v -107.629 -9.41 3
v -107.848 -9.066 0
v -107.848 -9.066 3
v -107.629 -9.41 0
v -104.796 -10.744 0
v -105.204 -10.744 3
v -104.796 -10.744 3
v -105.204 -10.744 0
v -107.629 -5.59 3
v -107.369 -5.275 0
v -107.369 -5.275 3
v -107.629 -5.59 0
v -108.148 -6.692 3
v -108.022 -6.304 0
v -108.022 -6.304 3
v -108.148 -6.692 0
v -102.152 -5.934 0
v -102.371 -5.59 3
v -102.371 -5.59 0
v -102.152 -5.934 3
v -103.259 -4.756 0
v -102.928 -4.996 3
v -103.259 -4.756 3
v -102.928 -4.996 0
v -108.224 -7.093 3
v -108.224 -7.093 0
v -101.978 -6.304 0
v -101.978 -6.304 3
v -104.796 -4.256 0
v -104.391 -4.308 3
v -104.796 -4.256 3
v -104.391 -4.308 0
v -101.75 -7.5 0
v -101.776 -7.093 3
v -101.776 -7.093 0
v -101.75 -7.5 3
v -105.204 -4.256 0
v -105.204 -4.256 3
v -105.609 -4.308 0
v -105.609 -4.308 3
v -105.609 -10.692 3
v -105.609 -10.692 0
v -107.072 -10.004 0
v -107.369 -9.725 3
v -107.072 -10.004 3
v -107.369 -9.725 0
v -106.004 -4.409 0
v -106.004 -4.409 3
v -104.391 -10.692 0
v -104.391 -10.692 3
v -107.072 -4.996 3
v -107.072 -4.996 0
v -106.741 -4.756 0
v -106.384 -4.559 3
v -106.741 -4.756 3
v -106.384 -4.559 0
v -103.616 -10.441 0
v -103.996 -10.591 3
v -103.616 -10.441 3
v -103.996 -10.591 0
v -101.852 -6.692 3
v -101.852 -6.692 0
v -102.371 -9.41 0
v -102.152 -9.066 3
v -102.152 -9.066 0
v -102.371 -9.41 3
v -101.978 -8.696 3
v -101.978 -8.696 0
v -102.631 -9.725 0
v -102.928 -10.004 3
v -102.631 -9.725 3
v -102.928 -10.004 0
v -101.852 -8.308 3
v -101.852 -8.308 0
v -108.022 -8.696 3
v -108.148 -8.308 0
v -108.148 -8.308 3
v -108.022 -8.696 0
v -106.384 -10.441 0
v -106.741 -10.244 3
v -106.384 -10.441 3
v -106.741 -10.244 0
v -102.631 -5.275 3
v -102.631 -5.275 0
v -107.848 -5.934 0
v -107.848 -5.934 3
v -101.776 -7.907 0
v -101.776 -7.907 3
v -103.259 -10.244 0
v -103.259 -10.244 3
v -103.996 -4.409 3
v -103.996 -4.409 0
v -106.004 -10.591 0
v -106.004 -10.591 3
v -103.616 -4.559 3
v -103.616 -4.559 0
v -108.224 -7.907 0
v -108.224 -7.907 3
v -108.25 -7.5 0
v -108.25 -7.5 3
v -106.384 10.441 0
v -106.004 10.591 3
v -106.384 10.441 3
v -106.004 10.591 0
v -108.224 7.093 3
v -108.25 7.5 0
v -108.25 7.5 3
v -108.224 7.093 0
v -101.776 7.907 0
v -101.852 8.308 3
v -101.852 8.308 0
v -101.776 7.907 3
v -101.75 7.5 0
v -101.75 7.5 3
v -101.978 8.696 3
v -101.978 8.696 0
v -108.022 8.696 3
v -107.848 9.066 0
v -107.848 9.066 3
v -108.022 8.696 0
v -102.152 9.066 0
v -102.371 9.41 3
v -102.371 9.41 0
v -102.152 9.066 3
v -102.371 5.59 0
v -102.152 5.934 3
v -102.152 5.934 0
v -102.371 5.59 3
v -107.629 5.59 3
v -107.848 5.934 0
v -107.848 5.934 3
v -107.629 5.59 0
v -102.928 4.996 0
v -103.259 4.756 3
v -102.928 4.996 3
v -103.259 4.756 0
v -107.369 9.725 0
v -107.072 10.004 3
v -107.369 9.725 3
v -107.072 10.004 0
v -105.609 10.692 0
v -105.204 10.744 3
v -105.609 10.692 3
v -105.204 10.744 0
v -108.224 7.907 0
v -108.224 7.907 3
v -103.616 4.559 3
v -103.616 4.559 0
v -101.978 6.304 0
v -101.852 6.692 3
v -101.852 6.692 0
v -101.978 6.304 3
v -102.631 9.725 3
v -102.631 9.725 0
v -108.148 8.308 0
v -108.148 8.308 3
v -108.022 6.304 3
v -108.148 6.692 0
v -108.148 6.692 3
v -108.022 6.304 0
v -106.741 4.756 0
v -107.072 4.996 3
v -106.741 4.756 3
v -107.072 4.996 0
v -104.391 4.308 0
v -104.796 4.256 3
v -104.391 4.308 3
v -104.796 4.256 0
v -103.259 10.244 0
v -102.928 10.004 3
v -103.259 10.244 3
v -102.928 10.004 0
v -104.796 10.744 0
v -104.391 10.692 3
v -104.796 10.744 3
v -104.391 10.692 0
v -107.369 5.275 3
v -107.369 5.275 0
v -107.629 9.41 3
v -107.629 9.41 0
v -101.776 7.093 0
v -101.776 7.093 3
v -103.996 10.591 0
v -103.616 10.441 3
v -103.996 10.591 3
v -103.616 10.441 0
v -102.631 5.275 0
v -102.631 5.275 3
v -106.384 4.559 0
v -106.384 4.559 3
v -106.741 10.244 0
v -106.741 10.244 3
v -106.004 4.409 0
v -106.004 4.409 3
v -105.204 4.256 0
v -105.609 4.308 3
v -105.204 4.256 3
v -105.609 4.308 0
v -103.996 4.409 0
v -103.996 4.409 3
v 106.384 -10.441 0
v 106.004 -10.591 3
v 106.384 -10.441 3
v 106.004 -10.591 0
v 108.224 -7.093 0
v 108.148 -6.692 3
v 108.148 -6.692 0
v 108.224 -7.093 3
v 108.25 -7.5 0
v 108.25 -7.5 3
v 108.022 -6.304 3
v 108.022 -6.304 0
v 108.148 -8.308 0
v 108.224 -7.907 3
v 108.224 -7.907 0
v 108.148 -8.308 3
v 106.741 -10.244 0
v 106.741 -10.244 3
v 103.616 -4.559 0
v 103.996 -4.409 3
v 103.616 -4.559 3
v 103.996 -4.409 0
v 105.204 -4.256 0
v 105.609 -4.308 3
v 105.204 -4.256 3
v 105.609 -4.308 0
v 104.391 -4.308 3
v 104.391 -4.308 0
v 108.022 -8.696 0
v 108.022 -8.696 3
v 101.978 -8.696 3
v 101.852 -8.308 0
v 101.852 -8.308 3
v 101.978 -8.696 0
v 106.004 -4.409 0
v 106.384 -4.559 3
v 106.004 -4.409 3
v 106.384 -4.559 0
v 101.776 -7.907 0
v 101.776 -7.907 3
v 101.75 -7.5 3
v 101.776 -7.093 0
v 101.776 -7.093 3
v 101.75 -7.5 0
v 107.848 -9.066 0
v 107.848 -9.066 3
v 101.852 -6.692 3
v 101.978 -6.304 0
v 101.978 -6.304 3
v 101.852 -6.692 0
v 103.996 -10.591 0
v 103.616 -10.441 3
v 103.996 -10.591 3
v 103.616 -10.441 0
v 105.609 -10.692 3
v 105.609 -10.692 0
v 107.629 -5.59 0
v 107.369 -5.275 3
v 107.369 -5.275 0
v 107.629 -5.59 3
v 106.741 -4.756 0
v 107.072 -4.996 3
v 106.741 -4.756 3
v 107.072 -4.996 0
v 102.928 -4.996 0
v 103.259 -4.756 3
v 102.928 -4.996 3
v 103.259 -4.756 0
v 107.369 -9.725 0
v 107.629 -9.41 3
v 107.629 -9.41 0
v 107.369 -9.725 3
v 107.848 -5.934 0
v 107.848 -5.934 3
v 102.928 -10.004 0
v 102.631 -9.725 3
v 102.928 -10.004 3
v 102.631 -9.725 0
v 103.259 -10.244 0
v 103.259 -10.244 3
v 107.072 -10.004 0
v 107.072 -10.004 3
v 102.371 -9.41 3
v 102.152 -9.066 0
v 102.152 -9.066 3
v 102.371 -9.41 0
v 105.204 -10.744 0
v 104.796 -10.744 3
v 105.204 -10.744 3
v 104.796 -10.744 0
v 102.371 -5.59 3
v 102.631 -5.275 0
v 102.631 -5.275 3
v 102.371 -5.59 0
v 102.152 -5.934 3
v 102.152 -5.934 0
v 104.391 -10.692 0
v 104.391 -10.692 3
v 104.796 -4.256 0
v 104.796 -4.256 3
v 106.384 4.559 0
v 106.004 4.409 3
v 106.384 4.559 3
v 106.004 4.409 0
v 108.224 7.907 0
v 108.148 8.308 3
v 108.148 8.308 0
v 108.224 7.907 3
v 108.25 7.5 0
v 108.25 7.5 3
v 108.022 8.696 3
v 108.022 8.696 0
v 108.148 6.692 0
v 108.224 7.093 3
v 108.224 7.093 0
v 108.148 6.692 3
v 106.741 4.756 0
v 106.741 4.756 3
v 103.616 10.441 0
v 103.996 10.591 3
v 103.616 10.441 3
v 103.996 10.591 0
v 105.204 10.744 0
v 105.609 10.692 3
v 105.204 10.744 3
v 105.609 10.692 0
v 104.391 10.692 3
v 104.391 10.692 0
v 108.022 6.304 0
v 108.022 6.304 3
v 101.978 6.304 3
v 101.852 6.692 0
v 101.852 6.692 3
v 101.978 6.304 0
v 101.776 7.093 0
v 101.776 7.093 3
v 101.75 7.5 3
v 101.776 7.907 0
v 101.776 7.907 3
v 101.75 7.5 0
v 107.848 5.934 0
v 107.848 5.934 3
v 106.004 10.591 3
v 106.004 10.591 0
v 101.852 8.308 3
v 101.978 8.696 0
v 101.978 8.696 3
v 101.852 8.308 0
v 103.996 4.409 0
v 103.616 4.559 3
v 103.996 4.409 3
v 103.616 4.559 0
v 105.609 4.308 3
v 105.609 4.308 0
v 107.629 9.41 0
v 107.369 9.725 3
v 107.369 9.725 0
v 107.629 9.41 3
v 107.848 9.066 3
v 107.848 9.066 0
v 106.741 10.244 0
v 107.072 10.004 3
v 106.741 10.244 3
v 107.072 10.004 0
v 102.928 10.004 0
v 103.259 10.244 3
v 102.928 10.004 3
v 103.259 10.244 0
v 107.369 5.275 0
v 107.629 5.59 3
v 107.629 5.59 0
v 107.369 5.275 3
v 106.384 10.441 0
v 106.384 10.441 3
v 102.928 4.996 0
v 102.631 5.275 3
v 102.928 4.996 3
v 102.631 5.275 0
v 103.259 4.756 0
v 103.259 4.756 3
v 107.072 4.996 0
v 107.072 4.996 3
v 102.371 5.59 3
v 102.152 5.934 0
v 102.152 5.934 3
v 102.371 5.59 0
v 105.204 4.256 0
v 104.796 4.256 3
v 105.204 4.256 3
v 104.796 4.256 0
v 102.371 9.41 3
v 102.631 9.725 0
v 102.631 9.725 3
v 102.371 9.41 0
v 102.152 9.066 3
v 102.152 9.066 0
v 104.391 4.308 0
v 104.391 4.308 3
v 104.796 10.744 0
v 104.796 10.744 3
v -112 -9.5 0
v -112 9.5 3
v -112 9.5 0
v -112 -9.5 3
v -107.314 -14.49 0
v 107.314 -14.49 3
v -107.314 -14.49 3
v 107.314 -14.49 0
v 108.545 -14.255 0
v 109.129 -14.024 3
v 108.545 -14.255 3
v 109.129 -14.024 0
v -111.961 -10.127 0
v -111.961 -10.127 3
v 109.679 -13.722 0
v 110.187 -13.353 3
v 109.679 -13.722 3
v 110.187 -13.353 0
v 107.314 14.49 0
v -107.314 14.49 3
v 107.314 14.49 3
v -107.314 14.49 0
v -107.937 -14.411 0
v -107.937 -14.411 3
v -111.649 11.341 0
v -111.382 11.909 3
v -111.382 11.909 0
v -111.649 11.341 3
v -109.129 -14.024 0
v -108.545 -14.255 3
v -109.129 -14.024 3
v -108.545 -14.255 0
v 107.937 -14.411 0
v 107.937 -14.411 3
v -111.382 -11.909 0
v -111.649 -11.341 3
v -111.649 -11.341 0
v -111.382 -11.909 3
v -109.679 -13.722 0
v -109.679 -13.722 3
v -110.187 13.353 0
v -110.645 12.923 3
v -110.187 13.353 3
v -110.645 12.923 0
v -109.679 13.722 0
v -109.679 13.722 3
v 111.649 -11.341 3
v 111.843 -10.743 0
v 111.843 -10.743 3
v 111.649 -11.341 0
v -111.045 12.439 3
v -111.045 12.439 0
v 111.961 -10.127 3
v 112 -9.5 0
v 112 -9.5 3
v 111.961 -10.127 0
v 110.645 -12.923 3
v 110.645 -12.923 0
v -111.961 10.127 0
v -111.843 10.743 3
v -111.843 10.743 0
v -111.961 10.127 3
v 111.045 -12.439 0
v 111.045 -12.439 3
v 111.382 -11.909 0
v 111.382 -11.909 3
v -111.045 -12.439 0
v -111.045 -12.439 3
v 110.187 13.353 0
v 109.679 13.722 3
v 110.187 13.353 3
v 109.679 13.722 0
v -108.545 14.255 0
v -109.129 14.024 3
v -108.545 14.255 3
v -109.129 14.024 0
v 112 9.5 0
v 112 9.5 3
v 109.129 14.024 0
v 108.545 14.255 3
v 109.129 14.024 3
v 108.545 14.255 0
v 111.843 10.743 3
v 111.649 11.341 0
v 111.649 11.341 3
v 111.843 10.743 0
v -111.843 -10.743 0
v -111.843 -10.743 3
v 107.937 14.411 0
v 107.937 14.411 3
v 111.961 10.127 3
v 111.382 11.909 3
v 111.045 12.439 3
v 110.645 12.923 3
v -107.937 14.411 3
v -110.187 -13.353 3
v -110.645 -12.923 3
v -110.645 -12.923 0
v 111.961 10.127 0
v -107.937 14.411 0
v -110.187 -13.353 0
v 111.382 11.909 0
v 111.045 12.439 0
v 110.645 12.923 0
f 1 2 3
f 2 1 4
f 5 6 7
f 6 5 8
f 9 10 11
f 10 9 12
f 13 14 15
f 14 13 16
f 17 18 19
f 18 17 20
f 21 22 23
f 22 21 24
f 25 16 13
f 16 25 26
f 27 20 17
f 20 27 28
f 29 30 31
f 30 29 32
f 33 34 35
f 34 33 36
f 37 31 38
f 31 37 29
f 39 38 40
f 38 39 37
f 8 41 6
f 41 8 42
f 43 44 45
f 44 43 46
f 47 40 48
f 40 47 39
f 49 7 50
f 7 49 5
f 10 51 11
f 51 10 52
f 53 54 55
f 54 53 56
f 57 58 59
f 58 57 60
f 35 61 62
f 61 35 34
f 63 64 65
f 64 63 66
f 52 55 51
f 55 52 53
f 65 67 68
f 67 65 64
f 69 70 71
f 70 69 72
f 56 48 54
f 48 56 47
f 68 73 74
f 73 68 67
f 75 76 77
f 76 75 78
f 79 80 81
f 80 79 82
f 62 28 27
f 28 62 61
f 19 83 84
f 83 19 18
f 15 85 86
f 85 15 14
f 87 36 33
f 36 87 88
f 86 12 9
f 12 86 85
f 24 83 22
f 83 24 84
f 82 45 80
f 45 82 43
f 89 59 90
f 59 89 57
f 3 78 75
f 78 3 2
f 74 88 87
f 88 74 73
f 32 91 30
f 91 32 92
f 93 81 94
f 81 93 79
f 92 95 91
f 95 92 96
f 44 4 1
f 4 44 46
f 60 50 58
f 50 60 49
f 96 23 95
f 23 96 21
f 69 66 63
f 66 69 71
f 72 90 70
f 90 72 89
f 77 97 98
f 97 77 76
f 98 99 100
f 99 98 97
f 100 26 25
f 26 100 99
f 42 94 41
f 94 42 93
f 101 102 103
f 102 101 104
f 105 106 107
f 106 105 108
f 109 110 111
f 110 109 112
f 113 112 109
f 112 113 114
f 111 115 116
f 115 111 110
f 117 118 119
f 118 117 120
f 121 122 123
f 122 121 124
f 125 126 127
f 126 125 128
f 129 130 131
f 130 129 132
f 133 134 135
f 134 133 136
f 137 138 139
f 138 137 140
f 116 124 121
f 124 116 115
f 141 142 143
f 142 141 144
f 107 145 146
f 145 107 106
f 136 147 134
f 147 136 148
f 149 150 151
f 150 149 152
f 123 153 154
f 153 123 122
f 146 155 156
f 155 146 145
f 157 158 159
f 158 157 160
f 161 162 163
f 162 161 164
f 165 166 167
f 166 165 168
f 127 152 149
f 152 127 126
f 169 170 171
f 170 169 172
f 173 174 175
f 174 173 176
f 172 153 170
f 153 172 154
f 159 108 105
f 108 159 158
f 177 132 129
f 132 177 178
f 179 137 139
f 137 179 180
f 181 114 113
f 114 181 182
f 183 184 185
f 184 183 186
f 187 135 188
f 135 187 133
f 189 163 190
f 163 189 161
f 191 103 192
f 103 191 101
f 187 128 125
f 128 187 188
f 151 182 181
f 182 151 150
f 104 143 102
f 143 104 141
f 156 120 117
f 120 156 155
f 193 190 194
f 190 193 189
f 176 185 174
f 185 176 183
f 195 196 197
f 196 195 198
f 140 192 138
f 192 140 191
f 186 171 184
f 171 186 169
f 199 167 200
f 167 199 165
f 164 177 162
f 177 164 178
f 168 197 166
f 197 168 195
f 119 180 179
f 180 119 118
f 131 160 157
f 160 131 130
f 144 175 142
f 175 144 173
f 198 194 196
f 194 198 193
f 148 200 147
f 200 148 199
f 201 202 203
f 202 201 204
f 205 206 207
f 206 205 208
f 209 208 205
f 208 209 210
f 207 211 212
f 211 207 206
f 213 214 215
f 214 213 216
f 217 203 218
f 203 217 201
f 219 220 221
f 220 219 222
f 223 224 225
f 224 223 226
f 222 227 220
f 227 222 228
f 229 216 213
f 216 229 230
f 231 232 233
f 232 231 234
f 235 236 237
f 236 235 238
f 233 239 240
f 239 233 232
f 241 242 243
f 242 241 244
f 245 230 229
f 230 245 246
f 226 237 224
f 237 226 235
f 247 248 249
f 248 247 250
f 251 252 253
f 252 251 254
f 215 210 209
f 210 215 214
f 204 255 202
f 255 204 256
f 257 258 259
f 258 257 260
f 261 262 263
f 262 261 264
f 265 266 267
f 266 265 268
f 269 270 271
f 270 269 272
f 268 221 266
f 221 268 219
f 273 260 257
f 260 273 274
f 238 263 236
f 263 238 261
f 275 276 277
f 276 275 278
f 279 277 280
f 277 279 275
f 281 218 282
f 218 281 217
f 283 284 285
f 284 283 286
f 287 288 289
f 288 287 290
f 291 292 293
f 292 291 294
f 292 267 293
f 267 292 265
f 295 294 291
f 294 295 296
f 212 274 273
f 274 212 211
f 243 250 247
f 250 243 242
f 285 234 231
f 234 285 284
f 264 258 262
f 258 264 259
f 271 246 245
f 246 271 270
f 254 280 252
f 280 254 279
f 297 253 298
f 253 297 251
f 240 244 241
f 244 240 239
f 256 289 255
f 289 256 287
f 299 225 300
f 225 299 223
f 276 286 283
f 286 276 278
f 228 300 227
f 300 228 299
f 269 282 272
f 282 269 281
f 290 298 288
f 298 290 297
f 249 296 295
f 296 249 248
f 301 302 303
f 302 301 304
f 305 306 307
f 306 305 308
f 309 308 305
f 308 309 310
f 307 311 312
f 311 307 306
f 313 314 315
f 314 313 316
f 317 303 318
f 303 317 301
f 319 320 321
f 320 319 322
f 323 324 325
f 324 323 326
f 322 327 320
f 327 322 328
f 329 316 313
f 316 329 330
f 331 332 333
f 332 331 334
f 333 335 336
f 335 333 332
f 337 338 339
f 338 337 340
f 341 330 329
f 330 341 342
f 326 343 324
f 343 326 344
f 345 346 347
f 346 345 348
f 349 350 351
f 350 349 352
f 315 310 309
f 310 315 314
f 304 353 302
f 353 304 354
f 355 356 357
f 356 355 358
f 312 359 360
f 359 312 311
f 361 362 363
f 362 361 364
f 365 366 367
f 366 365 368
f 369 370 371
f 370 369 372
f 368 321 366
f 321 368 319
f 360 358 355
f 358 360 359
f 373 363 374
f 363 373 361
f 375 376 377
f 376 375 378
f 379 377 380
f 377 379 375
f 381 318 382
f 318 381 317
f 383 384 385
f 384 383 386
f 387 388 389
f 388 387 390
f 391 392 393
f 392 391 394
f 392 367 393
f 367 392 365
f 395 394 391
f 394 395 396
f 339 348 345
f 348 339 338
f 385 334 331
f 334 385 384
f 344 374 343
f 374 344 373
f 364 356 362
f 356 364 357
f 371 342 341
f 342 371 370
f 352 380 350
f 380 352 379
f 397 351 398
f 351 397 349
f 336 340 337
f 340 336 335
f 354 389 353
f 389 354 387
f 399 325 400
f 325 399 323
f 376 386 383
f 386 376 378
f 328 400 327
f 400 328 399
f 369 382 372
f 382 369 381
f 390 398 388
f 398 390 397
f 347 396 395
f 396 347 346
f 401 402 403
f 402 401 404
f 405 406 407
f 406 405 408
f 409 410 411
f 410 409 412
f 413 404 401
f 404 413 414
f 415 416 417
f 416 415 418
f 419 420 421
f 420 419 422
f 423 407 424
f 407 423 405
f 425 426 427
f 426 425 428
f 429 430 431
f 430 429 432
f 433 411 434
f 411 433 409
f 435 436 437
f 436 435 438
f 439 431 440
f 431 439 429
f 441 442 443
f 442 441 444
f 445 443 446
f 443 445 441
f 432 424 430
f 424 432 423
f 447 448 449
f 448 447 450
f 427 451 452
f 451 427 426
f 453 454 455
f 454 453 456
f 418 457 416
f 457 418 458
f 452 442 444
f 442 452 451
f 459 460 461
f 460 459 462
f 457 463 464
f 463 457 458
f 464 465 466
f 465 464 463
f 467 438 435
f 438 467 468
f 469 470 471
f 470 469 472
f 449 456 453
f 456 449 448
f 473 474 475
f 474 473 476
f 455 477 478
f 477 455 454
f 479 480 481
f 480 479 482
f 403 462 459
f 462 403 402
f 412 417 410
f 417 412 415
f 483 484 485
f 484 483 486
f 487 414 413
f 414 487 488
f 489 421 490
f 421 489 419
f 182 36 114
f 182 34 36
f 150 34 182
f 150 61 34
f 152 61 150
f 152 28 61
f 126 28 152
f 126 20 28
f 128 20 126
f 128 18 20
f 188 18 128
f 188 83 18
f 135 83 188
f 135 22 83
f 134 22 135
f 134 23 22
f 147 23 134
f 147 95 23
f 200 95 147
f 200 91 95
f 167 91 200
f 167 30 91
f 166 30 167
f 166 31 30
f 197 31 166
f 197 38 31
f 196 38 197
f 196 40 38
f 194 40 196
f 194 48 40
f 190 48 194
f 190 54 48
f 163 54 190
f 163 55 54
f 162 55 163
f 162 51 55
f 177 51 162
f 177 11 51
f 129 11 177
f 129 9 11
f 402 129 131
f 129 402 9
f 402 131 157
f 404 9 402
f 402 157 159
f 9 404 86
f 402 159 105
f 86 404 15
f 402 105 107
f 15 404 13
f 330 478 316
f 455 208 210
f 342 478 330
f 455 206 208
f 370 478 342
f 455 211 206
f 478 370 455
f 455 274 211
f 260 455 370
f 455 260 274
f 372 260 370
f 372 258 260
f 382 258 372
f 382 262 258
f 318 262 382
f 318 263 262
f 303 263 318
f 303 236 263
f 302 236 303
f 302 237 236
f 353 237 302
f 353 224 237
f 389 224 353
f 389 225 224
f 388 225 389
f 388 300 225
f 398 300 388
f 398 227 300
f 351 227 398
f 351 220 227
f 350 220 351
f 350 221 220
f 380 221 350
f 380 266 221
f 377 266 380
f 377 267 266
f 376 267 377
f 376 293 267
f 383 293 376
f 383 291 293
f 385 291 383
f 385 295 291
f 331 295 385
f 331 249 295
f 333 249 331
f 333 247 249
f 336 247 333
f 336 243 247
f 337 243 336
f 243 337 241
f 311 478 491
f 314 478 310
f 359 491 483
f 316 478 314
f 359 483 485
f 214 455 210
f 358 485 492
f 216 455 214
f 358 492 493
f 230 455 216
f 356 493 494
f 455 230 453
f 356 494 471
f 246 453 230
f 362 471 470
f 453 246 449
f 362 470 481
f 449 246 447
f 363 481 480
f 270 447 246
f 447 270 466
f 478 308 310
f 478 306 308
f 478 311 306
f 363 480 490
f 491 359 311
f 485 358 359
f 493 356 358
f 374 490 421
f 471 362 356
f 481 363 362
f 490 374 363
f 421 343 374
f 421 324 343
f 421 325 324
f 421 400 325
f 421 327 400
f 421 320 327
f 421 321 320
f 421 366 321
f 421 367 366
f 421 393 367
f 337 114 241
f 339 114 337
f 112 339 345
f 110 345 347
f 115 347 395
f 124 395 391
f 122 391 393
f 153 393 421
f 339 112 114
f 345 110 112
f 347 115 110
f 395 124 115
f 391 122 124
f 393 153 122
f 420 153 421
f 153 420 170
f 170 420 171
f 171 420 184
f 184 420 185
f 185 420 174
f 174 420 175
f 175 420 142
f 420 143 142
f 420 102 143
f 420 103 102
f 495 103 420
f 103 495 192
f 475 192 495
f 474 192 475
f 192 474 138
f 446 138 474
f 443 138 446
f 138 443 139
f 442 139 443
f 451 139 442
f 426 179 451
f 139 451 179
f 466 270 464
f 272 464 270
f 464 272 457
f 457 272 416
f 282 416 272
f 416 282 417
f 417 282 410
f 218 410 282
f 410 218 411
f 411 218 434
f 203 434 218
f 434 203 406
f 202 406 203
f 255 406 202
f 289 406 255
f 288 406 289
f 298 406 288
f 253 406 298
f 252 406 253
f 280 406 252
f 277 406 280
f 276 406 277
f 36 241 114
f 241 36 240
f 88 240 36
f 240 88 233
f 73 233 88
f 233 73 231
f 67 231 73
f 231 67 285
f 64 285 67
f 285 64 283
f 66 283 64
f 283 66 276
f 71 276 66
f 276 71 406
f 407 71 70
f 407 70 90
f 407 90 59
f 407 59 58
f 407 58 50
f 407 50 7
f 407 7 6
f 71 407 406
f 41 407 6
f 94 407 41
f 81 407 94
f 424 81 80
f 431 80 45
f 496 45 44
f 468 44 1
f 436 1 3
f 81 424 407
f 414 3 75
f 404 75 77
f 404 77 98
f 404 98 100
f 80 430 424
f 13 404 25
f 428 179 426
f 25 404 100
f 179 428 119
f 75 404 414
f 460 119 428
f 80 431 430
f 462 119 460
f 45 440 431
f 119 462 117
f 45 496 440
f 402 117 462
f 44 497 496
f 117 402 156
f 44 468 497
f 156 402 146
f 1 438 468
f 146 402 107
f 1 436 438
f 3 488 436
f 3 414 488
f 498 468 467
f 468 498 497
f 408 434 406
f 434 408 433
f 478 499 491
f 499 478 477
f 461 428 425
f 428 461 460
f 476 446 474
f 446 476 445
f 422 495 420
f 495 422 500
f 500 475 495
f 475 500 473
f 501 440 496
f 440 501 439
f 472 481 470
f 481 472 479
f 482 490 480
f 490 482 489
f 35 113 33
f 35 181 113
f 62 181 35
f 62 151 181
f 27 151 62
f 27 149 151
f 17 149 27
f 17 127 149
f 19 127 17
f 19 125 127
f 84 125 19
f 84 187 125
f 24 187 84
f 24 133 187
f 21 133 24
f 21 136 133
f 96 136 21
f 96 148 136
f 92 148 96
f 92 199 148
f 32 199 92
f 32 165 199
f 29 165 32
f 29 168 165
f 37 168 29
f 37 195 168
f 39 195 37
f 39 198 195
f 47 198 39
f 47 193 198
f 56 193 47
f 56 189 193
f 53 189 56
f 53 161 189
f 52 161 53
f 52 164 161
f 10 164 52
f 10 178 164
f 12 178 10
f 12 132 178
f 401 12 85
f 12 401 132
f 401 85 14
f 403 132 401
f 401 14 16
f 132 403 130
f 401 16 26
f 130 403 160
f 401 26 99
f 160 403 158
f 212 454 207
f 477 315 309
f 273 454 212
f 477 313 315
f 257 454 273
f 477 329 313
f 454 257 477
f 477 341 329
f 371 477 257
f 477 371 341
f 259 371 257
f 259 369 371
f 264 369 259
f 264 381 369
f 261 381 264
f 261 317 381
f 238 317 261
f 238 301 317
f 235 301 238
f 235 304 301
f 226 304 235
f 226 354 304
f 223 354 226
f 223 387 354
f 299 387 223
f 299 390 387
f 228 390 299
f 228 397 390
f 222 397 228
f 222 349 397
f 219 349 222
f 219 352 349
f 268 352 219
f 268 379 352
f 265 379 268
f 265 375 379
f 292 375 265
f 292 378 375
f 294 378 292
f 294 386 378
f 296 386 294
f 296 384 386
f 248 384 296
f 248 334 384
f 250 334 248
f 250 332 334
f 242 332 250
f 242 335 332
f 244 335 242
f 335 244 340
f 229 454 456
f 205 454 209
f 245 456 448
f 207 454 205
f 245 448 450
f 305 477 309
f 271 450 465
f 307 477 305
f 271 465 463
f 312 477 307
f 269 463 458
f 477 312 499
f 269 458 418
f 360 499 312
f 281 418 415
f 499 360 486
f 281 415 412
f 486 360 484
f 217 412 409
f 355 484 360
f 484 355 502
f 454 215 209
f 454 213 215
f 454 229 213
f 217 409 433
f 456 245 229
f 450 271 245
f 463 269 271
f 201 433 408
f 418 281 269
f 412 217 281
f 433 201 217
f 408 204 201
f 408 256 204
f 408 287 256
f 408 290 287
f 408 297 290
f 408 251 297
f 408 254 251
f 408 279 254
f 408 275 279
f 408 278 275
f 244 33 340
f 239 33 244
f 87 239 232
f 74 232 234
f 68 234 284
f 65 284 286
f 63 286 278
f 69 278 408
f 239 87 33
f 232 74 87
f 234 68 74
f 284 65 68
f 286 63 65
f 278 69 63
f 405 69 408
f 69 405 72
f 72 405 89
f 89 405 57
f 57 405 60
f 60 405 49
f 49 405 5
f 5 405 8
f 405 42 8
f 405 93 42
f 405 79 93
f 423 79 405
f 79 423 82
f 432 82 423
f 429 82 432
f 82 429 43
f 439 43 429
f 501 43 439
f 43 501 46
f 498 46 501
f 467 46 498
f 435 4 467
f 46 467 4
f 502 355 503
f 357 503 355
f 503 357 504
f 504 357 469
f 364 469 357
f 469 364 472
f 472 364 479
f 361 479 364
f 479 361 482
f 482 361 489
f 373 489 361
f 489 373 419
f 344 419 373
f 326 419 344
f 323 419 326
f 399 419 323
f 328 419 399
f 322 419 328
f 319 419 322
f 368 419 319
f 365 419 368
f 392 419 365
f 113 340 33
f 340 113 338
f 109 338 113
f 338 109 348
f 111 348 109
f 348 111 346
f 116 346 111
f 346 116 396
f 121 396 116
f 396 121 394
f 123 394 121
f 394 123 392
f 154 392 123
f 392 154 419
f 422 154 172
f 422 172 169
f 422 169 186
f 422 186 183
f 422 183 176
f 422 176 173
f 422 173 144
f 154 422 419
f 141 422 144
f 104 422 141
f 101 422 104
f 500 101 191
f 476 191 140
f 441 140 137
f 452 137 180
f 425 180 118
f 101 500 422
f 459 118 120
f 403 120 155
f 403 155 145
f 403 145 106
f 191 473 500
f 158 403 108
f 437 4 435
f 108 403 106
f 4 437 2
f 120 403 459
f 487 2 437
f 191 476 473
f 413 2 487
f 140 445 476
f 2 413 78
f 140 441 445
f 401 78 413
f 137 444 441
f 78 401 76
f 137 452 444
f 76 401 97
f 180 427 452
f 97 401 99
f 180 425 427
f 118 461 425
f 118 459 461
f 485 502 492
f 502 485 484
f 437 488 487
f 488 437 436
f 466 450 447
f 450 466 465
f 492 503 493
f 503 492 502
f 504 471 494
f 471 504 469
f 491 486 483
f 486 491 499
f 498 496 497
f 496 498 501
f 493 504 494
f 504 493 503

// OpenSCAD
$fn = 50;


difference() {
	union() {
		hull() {
			translate(v = [-107.0000000000, 9.5000000000, 0]) {
				cylinder(h = 3, r = 5);
			}
			translate(v = [107.0000000000, 9.5000000000, 0]) {
				cylinder(h = 3, r = 5);
			}
			translate(v = [-107.0000000000, -9.5000000000, 0]) {
				cylinder(h = 3, r = 5);
			}
			translate(v = [107.0000000000, -9.5000000000, 0]) {
				cylinder(h = 3, r = 5);
			}
		}
	}
	union() {
		translate(v = [-105.0000000000, -7.5000000000, -100.0000000000]) {
			cylinder(h = 200, r = 3.2500000000);
		}
		translate(v = [-105.0000000000, 7.5000000000, -100.0000000000]) {
			cylinder(h = 200, r = 3.2500000000);
		}
		translate(v = [105.0000000000, -7.5000000000, -100.0000000000]) {
			cylinder(h = 200, r = 3.2500000000);
		}
		translate(v = [105.0000000000, 7.5000000000, -100.0000000000]) {
			cylinder(h = 200, r = 3.2500000000);
		}
	}
}
